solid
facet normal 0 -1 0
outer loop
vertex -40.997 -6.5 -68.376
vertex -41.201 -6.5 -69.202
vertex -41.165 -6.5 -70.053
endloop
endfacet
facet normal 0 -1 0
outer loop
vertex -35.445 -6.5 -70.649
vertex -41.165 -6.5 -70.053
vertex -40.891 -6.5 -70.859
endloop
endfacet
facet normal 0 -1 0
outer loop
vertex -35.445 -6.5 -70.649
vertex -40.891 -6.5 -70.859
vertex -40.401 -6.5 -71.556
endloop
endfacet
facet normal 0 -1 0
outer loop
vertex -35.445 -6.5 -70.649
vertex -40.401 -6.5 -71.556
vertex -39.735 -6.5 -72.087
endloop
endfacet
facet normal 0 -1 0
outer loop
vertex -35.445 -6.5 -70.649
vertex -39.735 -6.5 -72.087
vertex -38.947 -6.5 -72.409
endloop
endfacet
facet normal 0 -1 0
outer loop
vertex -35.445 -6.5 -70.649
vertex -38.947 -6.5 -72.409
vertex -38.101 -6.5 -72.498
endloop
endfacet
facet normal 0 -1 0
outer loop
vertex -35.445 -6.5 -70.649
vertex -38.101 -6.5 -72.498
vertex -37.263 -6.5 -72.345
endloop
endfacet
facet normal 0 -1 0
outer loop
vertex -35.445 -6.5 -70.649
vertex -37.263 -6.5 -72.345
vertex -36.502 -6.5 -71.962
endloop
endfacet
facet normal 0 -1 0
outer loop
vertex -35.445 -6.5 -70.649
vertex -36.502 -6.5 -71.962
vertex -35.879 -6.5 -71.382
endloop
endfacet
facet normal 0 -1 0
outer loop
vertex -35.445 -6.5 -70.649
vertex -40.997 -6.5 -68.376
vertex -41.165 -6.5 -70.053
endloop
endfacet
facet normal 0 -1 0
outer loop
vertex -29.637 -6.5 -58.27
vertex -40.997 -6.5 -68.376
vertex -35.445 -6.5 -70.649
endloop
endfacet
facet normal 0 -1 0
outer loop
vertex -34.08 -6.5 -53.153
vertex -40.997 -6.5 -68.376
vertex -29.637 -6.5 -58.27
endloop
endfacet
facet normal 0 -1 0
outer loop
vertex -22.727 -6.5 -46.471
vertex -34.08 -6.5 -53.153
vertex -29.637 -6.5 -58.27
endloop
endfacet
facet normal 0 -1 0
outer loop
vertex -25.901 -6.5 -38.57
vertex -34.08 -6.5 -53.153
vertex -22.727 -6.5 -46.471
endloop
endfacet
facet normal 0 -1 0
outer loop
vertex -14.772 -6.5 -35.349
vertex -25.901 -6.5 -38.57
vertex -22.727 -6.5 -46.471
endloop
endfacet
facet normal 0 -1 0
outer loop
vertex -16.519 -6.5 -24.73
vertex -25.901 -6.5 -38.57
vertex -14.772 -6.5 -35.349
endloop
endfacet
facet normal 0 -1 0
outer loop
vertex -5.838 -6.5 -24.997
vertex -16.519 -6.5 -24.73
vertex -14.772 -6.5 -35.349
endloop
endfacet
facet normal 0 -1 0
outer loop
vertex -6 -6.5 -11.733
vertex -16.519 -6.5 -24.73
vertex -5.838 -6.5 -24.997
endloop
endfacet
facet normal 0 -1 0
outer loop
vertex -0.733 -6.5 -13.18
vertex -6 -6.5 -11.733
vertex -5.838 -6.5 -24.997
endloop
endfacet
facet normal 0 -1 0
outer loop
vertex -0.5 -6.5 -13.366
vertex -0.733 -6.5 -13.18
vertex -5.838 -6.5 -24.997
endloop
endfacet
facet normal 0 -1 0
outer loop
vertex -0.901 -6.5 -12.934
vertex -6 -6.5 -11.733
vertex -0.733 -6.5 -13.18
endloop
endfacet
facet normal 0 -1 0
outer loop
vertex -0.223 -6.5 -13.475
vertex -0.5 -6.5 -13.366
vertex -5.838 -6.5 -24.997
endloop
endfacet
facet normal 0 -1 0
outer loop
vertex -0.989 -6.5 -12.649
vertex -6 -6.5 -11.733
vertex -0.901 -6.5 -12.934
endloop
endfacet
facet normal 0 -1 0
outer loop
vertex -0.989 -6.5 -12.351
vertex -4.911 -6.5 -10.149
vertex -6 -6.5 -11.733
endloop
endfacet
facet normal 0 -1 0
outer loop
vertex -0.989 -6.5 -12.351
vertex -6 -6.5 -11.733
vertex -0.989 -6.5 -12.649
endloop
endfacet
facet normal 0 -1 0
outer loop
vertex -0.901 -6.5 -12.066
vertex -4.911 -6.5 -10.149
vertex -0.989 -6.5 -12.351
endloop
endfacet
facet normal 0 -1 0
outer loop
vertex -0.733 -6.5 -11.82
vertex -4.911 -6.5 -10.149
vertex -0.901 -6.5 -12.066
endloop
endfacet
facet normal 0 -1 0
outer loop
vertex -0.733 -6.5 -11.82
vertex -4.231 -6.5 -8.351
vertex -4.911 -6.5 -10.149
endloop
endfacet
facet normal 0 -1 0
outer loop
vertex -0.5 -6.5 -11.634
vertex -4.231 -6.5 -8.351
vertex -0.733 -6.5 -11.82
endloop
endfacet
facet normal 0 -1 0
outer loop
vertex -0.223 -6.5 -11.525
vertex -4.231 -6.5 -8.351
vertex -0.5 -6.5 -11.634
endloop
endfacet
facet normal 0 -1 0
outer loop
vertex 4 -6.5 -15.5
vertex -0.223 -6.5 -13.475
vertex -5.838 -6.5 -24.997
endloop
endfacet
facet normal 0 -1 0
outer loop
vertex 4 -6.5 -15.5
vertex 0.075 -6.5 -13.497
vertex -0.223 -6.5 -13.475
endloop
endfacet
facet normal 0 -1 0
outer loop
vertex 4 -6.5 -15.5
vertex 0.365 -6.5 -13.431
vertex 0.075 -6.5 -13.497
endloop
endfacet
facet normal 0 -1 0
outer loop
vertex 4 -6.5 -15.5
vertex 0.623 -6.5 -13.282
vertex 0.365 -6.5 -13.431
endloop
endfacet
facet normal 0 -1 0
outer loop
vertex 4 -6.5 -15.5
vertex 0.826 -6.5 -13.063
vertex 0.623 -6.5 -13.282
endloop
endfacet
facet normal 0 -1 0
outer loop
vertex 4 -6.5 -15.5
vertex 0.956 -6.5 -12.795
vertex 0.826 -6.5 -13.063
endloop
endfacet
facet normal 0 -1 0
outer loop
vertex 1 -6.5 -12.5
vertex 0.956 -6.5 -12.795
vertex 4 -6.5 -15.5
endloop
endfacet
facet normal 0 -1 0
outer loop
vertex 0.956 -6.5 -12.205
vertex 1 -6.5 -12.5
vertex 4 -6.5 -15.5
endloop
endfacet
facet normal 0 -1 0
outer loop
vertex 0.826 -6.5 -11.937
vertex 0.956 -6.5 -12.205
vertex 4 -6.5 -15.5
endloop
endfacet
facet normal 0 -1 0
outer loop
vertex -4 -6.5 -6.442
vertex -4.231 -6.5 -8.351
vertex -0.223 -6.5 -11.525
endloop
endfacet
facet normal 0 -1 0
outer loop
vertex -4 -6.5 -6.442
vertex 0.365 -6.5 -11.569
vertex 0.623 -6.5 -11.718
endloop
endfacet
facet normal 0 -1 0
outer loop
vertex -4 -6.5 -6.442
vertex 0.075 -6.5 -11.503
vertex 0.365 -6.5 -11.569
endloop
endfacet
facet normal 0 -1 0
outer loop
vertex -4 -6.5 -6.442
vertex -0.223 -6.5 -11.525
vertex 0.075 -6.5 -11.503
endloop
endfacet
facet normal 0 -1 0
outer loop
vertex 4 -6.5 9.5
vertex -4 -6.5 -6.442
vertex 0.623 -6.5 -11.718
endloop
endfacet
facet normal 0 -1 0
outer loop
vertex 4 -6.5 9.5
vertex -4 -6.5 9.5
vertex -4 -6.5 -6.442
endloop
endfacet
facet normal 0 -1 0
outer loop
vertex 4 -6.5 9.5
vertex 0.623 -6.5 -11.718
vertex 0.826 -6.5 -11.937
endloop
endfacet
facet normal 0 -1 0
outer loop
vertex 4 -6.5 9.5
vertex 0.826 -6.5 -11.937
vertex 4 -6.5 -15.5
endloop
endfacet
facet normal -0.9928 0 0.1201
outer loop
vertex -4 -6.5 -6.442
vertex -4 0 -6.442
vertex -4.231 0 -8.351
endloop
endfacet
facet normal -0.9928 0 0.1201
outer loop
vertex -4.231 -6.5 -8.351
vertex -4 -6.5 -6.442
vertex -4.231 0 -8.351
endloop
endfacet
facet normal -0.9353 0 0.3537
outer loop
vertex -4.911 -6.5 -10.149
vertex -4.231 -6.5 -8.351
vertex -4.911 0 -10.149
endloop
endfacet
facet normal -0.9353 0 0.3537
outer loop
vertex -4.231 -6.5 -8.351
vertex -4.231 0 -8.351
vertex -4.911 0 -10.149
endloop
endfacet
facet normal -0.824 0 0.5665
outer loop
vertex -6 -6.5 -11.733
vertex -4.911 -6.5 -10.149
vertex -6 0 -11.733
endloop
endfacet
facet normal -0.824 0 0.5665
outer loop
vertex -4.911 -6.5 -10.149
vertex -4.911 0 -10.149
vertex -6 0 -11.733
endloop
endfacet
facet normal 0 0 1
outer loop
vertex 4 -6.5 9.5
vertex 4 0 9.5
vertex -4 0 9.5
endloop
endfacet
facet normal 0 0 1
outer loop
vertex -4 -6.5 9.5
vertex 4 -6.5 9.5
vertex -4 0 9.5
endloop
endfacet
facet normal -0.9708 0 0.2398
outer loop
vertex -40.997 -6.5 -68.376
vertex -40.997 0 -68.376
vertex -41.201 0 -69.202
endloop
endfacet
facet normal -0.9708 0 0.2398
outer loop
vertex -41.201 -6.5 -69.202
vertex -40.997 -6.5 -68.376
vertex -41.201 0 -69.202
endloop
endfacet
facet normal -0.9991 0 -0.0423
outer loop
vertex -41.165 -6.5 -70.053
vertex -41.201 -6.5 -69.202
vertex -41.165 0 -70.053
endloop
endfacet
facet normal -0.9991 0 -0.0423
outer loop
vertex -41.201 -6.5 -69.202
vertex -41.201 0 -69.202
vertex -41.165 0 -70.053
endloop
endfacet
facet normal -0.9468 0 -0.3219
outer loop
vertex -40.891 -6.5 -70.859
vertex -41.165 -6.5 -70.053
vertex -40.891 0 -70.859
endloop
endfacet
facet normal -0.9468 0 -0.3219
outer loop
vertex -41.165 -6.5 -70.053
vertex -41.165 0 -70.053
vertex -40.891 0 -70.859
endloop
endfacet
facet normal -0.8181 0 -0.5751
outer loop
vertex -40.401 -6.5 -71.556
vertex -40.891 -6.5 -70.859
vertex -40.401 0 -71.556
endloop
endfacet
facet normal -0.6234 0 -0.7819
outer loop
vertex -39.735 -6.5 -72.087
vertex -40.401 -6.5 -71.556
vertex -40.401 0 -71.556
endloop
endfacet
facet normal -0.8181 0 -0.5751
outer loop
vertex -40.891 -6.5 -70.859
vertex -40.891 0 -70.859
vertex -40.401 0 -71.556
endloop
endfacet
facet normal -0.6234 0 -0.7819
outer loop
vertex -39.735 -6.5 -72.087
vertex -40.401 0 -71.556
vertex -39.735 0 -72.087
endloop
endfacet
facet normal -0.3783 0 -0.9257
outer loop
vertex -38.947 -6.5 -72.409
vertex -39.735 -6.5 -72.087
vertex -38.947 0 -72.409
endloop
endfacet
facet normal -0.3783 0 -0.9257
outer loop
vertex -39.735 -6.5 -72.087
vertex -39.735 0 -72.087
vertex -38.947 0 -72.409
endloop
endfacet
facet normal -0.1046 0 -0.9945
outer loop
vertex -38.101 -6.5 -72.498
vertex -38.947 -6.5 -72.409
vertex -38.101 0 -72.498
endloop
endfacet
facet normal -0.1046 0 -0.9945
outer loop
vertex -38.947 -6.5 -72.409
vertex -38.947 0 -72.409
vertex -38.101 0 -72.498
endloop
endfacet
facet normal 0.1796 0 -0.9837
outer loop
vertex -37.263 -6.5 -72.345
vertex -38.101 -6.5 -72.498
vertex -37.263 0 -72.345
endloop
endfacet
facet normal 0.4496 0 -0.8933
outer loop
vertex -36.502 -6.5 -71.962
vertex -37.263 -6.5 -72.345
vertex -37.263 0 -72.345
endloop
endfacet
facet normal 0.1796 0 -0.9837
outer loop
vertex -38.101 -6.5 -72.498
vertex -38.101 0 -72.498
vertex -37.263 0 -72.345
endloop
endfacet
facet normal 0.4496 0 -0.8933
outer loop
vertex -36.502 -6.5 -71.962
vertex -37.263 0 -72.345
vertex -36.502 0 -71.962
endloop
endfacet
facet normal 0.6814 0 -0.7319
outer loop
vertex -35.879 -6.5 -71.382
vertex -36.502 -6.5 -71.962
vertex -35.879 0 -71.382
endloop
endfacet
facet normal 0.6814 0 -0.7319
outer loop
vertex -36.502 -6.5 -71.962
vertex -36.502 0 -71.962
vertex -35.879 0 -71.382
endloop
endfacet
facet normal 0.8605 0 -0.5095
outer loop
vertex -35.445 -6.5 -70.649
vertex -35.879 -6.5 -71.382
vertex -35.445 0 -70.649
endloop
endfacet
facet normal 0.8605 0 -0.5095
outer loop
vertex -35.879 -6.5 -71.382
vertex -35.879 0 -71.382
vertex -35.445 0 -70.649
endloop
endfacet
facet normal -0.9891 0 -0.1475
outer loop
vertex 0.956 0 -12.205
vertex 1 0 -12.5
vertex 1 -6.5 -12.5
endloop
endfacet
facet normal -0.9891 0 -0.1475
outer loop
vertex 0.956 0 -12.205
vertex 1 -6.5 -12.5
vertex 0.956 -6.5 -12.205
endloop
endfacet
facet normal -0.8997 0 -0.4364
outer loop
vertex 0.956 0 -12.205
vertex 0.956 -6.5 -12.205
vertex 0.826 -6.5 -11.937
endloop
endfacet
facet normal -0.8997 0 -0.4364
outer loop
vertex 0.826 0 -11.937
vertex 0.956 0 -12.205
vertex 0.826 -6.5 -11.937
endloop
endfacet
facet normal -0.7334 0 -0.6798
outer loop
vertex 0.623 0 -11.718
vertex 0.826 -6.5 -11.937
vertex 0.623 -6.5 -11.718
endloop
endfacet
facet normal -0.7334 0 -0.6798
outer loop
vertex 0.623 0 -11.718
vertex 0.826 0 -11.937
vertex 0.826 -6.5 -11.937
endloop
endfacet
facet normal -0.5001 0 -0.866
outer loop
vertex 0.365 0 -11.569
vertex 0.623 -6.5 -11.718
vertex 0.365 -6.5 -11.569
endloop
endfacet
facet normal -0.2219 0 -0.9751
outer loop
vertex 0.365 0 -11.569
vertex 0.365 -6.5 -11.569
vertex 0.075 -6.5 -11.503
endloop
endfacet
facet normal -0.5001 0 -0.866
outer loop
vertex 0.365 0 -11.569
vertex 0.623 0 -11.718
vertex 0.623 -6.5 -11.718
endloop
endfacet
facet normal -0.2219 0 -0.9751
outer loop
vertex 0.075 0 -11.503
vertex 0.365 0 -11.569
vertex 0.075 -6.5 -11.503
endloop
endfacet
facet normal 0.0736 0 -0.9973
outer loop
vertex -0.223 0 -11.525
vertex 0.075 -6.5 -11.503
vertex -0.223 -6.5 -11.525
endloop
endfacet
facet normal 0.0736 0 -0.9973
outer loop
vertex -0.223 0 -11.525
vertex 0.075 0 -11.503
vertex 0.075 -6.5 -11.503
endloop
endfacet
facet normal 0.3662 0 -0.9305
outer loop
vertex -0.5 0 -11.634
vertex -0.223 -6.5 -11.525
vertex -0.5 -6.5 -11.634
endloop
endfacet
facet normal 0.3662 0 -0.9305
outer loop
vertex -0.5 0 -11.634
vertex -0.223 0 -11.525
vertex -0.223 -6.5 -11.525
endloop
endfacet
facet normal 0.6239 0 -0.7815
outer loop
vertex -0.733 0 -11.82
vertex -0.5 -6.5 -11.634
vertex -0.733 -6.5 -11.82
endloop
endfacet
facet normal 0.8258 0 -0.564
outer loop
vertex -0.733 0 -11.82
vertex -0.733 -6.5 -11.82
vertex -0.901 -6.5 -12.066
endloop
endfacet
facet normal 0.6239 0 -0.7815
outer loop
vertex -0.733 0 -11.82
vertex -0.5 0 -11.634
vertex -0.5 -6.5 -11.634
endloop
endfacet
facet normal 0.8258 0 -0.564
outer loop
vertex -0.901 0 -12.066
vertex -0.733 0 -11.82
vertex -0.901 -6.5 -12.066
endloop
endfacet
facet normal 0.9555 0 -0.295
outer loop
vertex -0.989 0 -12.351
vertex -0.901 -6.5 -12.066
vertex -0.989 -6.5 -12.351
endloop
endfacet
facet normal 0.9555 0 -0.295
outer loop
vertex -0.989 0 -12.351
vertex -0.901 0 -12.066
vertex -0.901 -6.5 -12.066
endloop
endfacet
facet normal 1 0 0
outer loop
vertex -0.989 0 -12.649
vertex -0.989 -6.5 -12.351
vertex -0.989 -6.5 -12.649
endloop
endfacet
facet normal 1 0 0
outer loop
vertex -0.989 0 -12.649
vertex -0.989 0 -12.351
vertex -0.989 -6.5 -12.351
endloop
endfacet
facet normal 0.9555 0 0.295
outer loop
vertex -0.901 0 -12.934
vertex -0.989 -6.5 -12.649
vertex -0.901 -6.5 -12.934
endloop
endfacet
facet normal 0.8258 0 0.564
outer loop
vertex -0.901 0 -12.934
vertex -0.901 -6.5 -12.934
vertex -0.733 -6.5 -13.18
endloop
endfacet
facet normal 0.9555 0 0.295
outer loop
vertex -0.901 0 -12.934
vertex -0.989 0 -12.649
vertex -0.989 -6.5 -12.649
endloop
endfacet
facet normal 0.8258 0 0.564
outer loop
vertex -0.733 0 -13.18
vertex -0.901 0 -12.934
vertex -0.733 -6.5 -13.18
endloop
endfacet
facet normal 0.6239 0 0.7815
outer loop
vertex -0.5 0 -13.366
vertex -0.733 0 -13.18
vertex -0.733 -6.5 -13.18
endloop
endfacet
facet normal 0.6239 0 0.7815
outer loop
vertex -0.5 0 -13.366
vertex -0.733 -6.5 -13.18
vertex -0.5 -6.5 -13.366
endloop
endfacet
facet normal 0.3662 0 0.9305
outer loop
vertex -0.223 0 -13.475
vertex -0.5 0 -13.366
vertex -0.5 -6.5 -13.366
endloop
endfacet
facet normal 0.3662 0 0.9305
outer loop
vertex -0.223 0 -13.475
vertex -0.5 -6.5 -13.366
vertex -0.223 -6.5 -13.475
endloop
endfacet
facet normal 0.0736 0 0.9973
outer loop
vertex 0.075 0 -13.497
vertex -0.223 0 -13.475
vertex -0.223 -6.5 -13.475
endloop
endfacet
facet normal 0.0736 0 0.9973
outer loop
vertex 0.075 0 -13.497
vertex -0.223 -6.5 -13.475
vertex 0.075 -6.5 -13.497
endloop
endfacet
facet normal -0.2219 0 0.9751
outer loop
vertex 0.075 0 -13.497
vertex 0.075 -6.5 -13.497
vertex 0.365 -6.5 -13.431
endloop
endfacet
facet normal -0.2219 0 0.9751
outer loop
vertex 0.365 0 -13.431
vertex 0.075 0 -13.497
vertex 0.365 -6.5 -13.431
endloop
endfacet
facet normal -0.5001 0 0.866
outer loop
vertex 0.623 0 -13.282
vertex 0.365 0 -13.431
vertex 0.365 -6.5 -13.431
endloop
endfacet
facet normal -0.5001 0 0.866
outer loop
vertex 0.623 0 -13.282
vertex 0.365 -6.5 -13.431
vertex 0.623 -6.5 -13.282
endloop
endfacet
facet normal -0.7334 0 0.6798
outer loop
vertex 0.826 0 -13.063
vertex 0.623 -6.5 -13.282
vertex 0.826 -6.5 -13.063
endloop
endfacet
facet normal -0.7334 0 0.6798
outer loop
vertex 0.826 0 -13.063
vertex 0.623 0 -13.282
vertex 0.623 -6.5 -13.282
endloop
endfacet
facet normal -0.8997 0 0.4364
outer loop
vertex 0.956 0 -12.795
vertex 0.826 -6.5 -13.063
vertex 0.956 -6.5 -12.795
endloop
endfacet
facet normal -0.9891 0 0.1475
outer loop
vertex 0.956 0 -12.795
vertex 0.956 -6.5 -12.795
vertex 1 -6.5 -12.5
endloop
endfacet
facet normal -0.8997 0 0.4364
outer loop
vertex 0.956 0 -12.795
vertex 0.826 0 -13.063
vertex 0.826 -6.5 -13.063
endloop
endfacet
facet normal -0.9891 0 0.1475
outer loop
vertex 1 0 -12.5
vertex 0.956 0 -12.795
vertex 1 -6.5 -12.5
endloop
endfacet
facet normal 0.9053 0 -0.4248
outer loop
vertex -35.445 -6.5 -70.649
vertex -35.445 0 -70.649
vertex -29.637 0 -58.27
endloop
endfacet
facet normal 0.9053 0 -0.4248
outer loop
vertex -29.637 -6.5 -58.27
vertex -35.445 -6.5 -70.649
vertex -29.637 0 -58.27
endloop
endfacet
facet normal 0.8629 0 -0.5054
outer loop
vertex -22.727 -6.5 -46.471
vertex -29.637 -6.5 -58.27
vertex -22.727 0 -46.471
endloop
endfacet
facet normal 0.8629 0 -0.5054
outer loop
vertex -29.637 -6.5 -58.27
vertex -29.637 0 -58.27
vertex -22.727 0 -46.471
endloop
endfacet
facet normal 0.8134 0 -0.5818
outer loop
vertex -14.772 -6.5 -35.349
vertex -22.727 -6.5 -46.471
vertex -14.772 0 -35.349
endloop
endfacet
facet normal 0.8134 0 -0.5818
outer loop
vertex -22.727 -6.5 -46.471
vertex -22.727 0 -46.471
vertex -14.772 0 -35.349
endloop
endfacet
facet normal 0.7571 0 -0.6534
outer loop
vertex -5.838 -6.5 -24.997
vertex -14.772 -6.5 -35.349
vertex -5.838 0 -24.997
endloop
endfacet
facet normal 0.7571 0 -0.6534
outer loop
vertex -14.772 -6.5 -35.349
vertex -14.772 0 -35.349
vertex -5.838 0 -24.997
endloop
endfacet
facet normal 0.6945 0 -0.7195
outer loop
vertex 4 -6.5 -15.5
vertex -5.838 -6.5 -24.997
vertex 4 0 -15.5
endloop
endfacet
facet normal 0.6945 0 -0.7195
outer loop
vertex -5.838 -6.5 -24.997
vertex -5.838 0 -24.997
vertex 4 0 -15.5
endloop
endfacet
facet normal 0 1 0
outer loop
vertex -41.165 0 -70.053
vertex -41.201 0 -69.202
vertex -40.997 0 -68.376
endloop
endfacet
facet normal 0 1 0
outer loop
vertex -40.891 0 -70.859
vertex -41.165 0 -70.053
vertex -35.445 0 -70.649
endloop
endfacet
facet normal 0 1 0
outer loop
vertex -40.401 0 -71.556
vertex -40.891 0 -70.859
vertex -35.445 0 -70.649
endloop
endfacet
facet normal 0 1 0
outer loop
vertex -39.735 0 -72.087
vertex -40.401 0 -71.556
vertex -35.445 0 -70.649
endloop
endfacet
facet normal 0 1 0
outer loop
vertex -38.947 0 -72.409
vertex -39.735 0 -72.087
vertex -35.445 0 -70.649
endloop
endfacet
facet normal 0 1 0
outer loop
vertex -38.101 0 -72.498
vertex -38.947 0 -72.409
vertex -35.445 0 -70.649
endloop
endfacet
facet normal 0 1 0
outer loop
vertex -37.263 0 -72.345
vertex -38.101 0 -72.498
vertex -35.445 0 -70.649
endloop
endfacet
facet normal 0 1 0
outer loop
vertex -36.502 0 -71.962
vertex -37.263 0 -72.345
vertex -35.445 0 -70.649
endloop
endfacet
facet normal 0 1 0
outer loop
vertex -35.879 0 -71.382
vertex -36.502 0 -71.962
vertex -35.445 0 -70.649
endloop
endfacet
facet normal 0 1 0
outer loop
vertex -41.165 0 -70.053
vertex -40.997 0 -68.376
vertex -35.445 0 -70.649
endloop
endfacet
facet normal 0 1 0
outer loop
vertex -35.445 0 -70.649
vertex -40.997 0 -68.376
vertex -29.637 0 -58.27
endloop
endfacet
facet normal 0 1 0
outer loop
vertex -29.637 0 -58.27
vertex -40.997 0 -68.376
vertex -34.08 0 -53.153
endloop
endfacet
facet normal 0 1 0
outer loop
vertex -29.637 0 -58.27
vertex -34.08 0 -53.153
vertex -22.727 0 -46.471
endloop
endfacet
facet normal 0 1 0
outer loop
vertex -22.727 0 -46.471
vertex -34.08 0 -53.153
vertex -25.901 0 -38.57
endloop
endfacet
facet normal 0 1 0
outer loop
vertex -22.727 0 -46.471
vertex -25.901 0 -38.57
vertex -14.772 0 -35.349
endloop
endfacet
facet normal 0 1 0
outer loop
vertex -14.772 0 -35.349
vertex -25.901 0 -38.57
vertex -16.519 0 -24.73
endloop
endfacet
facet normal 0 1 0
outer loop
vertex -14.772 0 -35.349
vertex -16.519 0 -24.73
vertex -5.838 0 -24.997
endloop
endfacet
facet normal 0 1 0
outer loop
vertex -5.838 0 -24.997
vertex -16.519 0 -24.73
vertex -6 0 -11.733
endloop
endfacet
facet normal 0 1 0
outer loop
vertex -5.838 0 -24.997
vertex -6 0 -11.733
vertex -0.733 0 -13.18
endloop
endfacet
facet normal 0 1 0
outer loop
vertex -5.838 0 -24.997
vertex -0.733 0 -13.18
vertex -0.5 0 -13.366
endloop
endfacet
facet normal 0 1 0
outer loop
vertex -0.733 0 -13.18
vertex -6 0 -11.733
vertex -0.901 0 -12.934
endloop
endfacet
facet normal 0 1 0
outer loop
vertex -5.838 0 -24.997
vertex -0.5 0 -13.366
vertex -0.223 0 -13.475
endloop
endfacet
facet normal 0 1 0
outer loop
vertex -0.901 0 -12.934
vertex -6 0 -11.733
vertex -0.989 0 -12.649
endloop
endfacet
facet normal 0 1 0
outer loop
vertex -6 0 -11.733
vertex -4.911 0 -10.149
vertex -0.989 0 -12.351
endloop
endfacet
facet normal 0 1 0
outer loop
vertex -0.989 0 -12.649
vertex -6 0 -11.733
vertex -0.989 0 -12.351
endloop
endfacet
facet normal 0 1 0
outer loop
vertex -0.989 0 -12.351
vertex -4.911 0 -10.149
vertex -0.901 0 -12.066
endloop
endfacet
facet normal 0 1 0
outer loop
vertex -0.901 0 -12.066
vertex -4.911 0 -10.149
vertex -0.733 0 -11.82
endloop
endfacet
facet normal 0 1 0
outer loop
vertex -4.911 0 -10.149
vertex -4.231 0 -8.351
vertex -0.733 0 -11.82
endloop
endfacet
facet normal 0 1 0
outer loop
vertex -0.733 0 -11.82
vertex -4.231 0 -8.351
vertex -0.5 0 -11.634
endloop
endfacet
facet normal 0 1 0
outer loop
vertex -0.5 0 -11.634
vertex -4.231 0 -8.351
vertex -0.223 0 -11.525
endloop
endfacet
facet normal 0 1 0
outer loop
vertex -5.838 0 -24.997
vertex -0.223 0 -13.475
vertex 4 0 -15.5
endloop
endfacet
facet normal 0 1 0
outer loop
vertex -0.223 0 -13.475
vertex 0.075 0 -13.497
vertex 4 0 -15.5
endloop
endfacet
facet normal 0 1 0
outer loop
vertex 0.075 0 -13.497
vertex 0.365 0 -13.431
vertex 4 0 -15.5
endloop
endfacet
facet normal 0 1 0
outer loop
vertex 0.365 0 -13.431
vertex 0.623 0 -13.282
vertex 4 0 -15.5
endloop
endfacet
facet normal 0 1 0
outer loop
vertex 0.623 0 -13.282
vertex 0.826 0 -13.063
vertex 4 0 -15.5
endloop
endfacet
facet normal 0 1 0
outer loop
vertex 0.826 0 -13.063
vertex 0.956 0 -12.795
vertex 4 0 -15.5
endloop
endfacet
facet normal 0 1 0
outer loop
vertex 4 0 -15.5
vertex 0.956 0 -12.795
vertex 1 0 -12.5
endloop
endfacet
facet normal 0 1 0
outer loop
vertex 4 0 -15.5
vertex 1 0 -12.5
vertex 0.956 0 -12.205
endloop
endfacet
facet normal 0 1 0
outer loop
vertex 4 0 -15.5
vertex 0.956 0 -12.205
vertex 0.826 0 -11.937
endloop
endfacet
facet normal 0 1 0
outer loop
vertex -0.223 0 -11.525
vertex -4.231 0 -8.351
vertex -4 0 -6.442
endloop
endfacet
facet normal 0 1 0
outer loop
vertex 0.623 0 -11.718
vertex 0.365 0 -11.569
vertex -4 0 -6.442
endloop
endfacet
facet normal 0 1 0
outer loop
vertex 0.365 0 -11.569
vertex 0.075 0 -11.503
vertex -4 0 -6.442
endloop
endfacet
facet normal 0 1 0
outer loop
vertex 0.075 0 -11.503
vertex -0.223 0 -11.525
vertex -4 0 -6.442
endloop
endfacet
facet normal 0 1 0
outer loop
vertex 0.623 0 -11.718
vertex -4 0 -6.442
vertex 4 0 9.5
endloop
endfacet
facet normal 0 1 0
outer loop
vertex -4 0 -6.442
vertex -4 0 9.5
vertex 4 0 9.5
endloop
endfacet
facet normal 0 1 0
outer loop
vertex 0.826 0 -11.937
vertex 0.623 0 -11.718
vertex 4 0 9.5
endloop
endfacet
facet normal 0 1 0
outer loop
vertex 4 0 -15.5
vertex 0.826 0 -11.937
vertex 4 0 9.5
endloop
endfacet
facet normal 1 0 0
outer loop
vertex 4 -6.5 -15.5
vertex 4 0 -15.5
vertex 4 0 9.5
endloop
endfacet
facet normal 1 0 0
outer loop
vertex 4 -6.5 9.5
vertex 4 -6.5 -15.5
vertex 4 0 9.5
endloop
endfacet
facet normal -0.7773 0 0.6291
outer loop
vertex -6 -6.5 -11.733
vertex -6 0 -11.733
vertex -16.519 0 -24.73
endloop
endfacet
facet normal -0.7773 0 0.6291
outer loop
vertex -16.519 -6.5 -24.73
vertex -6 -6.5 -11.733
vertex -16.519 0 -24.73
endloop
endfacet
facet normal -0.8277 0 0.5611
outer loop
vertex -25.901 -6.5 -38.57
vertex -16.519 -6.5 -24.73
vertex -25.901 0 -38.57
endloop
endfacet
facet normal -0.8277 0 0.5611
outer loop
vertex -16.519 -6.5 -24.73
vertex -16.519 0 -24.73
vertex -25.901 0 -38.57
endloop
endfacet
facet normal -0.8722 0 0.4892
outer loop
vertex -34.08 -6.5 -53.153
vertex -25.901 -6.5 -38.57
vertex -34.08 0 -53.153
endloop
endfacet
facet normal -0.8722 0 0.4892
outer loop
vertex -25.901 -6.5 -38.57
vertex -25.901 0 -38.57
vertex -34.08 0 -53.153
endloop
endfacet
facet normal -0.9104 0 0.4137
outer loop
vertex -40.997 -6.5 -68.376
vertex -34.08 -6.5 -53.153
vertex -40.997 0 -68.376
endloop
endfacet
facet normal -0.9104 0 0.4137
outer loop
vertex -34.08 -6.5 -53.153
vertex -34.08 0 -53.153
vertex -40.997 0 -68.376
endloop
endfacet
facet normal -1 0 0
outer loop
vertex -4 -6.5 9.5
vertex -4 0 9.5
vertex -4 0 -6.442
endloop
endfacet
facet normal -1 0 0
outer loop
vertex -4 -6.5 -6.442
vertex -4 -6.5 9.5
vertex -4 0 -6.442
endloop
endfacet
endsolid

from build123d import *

# Parameters (mm, degrees)
F0_R     = 1
F1_DEPTH = 6.5


with BuildPart() as f1:
    # F0 (on Front) → F1 (new body)
    with BuildSketch(Plane.XZ):
        with BuildLine():
            ThreePointArc((-35.216109, -69.5), (-37.643365, -66.55518), (-40.997419, -68.375582))
            ThreePointArc((-40.997419, -68.375582), (-39.352976, -72.276245), (-35.444986, -70.649293))
            ThreePointArc((-35.444986, -70.649293), (-35.273885, -70.085931), (-35.216109, -69.5))
        make_face()
        with BuildLine():
            Line((4, 9.5), (-4, 9.5))
            Line((-4, 9.5), (-4, -6.441955))
            ThreePointArc((-4, -6.441955), (-4.516669, -9.27034), (-5.999941, -11.73339))
            ThreePointArc((-5.999941, -11.73339), (-25.901345, -38.569953), (-40.997419, -68.375582))
            ThreePointArc((-40.997419, -68.375582), (-37.643365, -66.55518), (-35.216109, -69.5))
            ThreePointArc((-35.216109, -69.5), (-35.273885, -70.085931), (-35.444986, -70.649293))
            ThreePointArc((-35.444986, -70.649293), (-18.875971, -40.819152), (4, -15.5))
            Line((4, -15.5), (4, -9.5))
            Line((4, -9.5), (4, 9.5))
        make_face()
        with Locations((0, -12.5)):
            Circle(F0_R, mode=Mode.SUBTRACT)
    extrude(amount=F1_DEPTH)


solid = f1.part
